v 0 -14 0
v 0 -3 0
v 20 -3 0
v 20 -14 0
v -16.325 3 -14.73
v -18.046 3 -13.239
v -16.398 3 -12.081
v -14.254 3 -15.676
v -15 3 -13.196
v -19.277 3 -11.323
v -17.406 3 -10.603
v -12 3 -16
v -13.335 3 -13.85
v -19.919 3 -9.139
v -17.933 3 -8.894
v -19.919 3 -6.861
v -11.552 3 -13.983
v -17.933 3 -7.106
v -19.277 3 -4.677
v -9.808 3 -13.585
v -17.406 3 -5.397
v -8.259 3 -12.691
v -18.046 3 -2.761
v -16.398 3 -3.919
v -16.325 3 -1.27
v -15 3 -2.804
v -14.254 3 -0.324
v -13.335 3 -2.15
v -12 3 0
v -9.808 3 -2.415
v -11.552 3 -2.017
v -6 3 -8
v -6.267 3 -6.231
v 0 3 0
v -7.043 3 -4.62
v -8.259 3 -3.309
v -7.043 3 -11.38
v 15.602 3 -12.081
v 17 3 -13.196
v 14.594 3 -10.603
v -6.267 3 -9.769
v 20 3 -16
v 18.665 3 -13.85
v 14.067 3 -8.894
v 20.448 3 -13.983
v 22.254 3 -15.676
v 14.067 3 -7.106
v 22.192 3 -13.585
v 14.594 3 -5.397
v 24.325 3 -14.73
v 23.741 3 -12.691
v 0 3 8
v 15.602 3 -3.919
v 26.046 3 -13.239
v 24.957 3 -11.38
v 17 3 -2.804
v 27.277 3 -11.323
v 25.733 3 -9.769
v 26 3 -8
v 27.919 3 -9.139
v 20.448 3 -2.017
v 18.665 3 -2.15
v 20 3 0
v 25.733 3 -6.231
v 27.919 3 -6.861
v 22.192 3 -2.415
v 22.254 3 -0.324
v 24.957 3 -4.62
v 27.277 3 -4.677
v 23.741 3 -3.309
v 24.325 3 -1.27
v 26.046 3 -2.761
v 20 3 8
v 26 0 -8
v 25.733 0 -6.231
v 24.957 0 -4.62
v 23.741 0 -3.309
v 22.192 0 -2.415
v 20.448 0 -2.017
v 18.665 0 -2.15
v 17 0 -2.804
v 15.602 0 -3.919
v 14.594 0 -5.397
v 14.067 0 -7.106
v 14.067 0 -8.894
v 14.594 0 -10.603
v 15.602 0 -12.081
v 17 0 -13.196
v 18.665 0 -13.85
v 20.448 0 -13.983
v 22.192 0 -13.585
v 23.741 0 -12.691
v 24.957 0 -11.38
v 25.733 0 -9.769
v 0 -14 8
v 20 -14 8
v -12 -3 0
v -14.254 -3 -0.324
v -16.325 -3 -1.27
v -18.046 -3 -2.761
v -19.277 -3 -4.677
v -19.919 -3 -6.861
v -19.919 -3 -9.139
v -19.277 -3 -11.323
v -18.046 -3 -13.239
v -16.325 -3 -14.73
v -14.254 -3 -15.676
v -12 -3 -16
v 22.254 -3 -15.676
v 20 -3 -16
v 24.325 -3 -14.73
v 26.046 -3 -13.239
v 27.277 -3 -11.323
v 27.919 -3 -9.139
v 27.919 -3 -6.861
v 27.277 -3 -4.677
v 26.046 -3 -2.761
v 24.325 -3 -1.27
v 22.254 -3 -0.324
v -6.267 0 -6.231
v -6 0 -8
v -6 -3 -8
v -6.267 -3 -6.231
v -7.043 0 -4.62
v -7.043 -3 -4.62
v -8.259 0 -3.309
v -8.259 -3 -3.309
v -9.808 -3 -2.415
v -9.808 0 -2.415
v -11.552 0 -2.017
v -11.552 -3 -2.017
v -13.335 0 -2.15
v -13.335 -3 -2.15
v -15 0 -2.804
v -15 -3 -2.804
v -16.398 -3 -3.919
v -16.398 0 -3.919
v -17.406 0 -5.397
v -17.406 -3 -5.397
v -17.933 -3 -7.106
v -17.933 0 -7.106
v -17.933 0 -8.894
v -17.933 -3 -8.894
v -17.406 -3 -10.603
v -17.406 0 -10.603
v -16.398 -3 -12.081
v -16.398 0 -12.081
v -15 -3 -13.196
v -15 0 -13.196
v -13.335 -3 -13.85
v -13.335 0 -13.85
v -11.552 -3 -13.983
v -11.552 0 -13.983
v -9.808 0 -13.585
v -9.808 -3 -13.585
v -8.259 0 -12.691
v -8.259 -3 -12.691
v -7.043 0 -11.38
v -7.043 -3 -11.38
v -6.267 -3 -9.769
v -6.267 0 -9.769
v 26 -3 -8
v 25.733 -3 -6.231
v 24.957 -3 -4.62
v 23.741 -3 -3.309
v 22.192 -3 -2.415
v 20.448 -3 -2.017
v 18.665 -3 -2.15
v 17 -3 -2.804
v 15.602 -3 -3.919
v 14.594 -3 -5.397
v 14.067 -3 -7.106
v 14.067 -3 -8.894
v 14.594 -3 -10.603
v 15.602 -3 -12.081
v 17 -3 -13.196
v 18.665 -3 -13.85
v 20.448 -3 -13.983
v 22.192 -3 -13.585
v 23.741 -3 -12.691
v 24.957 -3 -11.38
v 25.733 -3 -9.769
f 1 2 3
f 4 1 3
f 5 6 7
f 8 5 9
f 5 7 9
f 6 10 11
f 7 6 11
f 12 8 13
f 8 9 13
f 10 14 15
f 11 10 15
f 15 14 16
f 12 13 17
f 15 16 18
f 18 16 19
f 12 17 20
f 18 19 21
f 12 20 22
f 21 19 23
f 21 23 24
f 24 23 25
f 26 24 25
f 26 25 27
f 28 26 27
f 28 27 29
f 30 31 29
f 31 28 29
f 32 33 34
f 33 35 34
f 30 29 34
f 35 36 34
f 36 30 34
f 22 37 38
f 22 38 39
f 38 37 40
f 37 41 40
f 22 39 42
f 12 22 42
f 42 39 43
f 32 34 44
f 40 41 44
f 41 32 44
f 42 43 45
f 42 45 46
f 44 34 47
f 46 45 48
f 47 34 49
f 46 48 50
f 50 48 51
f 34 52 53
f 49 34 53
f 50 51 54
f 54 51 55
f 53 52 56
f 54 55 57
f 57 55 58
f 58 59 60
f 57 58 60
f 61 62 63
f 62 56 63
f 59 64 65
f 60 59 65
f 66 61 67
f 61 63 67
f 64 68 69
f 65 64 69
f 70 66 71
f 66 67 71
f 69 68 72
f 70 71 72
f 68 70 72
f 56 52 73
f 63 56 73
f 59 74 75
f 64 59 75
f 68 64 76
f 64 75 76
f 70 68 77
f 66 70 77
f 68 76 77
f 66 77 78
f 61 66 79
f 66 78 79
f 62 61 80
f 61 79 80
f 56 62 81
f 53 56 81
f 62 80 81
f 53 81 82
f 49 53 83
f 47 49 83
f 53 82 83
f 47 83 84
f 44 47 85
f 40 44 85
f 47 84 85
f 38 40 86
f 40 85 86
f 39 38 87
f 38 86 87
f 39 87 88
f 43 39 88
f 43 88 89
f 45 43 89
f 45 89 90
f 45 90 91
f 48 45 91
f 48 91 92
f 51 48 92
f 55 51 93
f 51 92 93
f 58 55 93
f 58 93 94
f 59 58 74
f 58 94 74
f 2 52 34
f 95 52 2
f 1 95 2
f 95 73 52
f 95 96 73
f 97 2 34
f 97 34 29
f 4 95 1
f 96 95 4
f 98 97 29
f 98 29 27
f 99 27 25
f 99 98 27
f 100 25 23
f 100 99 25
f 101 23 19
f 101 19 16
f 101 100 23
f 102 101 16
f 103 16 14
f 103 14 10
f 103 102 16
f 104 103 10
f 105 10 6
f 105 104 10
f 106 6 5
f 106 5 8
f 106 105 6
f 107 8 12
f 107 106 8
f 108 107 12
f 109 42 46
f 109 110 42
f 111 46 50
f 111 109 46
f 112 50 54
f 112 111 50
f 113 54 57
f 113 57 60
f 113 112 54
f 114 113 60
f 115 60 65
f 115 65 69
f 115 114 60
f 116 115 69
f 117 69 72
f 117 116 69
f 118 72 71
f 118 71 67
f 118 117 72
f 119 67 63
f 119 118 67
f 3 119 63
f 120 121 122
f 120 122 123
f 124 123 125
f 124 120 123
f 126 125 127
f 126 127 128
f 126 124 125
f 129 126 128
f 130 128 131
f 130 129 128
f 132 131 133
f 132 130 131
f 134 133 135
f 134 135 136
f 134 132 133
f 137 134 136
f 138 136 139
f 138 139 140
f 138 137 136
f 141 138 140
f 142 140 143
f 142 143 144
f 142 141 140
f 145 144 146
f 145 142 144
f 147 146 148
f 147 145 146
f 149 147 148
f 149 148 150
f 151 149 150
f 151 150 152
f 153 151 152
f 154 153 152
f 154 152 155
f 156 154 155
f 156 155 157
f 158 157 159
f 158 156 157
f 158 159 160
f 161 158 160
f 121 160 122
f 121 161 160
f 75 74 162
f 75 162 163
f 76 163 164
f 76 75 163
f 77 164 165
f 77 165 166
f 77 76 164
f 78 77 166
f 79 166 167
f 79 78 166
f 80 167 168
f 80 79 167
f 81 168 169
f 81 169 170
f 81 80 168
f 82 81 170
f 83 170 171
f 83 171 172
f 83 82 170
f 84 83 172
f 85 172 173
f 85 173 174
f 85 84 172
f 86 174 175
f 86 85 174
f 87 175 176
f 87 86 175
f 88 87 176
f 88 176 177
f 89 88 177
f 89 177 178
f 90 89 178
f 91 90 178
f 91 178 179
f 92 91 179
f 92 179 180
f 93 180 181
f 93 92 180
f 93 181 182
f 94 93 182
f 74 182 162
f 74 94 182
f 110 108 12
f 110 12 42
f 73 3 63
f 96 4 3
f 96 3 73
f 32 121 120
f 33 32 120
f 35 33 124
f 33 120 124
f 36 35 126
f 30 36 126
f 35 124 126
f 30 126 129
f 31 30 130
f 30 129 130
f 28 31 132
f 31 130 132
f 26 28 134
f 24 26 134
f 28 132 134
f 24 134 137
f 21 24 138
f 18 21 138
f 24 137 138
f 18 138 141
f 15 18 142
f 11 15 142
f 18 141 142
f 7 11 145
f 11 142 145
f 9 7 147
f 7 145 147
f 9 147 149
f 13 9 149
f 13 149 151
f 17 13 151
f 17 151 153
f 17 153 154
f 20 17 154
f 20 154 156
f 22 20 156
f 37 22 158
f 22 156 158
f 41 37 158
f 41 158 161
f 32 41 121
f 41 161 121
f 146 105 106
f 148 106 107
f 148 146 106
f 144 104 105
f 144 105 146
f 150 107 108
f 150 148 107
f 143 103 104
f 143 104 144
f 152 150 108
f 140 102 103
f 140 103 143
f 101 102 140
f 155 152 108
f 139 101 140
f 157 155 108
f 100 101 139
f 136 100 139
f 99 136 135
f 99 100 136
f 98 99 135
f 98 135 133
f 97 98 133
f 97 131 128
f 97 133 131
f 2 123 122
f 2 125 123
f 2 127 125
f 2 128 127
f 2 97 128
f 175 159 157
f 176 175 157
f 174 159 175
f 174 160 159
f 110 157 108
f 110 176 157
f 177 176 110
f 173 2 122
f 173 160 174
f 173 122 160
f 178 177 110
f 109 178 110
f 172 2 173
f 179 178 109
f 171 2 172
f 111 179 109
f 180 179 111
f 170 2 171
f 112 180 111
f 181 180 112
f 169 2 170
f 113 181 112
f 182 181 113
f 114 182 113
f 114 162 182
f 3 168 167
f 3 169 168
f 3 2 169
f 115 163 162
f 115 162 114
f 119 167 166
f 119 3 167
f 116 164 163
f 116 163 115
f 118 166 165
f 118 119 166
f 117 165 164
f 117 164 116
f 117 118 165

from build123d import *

# Parameters (mm, degrees)
F0_R      = 6
F2_DEPTH  = 3
F3_W      = 20
F3_H      = 8
F4_DEPTH  = 14
F1_R      = 6
F4_FACE_W = 20
F4_FACE_H = 8
F5_DEPTH  = 3


with BuildPart() as f2:
    # F0 (on Front) → F2 (new body)
    with BuildSketch(Plane.XZ):
        with BuildLine():
            ThreePointArc((-12, 0), (-20, -8), (-12, -16))
            Line((-12, -16), (20, -16))
            ThreePointArc((20, -16), (28, -8), (20, 0))
            Line((20, 0), (20, 8))
            Line((20, 8), (0, 8))
            Line((0, 8), (0, 0))
            Line((0, 0), (-12, 0))
        make_face()
        with Locations((-12, -8)):
            Circle(F0_R, mode=Mode.SUBTRACT)
        with Locations((20, -8)):
            Circle(F0_R, mode=Mode.SUBTRACT)
    extrude(amount=F2_DEPTH)

    # F3 (on Front) → F4 (join)
    with BuildSketch(Plane.XZ):
        with Locations((10, 4)):
            Rectangle(F3_W, F3_H)
    extrude(amount=F4_DEPTH)

    # F1 (on Front) + F4_face (on face) → F5 (join)
    with BuildSketch(Plane.XZ):
        with BuildLine():
            Line((0, 8), (0, 0))
            Line((0, 0), (-12, 0))
            ThreePointArc((-12, 0), (-20, -8), (-12, -16))
            Line((-12, -16), (20, -16))
            ThreePointArc((20, -16), (28, -8), (20, 0))
            Line((20, 0), (20, 8))
            Line((20, 8), (0, 8))
        make_face()
        with Locations((-12, -8)):
            Circle(F1_R, mode=Mode.SUBTRACT)
        with Locations((20, -8)):
            Circle(F1_R, mode=Mode.SUBTRACT)
    with BuildSketch(Plane(origin=(10, -14, 4), x_dir=(1, 0, 0), z_dir=(0, -1, 0))):
        Rectangle(F4_FACE_W, F4_FACE_H)
    extrude(amount=-F5_DEPTH)


solid = f2.part
